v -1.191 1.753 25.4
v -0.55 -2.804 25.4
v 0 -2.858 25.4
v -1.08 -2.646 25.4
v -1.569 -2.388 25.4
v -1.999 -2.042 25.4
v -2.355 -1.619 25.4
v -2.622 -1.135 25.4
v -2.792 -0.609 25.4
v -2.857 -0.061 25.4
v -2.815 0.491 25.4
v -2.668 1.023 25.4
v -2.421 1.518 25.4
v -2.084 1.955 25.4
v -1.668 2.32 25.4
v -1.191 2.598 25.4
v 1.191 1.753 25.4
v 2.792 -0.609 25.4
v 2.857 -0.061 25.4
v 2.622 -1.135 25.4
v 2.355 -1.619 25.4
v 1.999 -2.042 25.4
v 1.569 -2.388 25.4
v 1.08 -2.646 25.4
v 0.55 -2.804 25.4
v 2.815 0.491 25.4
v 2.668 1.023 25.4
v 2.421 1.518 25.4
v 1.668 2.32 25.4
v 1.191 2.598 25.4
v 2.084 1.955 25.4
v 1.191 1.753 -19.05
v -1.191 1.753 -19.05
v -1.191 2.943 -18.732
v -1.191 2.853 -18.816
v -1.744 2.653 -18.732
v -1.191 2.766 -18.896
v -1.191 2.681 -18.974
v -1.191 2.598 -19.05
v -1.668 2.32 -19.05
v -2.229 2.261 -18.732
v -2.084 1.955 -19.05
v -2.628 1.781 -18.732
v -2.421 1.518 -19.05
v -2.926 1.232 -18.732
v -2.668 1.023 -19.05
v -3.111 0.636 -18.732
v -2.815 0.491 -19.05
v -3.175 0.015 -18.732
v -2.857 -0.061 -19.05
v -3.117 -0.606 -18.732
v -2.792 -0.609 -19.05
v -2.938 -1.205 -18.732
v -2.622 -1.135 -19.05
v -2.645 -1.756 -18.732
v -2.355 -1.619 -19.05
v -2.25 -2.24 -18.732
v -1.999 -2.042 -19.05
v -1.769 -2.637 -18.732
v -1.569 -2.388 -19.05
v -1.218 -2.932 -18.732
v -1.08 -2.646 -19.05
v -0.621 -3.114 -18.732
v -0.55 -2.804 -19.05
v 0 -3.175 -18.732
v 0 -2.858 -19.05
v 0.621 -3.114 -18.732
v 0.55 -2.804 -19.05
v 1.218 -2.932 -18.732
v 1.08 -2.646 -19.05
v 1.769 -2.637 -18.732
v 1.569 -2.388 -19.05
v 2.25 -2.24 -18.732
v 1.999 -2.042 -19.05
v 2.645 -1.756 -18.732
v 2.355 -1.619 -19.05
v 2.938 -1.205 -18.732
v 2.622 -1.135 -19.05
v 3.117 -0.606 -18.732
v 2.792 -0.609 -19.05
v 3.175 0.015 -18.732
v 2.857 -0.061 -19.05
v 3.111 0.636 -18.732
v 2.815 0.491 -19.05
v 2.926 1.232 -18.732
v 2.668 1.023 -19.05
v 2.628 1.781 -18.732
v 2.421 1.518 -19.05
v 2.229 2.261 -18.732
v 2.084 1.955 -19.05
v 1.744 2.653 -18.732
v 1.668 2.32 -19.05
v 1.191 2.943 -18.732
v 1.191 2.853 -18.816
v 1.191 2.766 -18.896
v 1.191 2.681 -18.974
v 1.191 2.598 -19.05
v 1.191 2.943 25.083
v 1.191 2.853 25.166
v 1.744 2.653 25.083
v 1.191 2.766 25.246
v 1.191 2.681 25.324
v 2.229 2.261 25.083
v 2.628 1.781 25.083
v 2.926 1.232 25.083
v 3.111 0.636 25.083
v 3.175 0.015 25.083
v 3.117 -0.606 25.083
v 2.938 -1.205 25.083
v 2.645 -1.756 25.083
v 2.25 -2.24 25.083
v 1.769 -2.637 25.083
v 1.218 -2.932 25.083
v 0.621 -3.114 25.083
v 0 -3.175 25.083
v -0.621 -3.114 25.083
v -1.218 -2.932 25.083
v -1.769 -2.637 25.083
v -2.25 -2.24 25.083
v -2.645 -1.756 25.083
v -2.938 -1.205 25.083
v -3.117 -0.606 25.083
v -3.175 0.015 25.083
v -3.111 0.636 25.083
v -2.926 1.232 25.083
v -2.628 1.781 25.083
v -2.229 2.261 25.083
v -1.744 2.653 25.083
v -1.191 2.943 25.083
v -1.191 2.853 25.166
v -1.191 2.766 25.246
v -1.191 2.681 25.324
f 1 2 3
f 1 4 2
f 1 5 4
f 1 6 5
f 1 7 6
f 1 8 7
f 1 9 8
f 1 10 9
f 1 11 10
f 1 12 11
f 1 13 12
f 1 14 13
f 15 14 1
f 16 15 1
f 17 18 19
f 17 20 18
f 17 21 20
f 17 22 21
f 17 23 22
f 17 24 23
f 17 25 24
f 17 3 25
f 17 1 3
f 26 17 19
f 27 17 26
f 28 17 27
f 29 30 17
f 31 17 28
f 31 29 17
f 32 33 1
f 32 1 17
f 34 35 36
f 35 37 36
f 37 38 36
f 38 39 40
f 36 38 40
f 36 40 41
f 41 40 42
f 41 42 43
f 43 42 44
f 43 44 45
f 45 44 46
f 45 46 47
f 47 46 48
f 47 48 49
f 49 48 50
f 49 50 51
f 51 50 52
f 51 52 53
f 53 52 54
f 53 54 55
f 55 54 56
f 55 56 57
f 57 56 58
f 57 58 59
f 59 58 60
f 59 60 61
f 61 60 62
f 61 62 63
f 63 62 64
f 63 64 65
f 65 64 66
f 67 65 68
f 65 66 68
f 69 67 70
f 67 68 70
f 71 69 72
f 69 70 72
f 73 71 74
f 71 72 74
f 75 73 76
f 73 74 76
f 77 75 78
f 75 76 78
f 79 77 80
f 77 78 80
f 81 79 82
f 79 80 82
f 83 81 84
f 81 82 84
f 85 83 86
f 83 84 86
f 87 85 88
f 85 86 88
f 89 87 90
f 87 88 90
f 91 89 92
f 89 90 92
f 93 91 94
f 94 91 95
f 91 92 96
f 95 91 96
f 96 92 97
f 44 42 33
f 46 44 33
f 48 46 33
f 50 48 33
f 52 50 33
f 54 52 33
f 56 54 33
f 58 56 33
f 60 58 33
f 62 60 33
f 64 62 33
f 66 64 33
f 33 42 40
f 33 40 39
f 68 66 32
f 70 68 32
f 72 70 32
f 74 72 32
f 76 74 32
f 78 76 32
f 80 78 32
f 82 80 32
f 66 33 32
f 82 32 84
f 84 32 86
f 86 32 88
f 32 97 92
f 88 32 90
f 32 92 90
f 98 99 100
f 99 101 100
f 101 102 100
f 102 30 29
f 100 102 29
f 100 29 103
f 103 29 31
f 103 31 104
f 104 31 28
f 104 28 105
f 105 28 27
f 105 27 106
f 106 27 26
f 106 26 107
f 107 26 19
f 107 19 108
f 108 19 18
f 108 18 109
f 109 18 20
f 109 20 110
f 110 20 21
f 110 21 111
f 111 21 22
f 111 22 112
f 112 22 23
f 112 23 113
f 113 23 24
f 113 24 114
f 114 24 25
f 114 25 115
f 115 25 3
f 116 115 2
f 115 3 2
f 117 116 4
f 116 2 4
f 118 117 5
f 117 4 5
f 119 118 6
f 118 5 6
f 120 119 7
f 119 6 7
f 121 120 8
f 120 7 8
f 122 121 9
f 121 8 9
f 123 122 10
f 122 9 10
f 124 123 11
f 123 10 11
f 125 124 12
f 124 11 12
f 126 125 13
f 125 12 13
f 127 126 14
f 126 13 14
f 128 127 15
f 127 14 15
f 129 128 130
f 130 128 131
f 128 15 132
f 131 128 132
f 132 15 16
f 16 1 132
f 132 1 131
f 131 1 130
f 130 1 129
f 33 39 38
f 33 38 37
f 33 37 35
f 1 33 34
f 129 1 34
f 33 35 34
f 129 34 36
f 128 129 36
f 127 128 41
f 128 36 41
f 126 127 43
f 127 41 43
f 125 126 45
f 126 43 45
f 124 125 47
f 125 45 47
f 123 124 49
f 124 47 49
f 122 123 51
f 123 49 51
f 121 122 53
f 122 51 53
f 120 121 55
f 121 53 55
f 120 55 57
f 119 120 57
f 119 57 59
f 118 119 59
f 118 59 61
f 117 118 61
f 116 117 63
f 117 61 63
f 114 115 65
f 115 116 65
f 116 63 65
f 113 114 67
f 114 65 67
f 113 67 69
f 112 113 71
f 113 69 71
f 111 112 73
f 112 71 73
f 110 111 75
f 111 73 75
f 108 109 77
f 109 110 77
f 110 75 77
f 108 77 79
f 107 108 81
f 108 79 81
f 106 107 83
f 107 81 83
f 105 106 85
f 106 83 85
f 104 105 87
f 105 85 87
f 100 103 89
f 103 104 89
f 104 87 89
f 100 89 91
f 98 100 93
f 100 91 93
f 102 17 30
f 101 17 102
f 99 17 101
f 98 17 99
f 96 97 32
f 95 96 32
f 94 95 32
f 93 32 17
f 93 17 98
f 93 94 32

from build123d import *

# Parameters (mm, degrees)
BOSS_EXTRUDE2_DEPTH      = 25.4
BOSS_EXTRUDE2_DEPTH_BACK = 19.05
SKETCH3_R                = 3.175
CUT_EXTRUDE5_DEPTH       = 26.793821935
CUT_EXTRUDE5_DEPTH_BACK  = 26.793821935
SKETCH10_W               = 2.38125
SKETCH10_H               = 1.422321225
CHAMFER1_SIZE            = 0.3175


with BuildPart() as part:
    # Sketch3 → Boss-Extrude2 (new, two sides: drawn at the far end of the back side and taken through both)
    with BuildSketch(Plane.XY.offset(-BOSS_EXTRUDE2_DEPTH_BACK)):
        Circle(SKETCH3_R)
    extrude(amount=BOSS_EXTRUDE2_DEPTH + BOSS_EXTRUDE2_DEPTH_BACK)

    # Sketch10 → Cut-Extrude5 (cut, two sides: drawn at the far end of the back side and taken through both)
    with BuildSketch(Plane.XY.offset(-CUT_EXTRUDE5_DEPTH_BACK)):
        with Locations((0, 2.463839388)):
            Rectangle(SKETCH10_W, SKETCH10_H)
    extrude(amount=CUT_EXTRUDE5_DEPTH + CUT_EXTRUDE5_DEPTH_BACK, mode=Mode.SUBTRACT)

    # Chamfer1
    chamfer1_edges = [part.edges().sort_by_distance(p)[0] for p in [
        (0, -3.175, -19.05),
        (0, -3.175, 25.4),
    ]]
    chamfer(chamfer1_edges, length=CHAMFER1_SIZE)


solid = part.part
